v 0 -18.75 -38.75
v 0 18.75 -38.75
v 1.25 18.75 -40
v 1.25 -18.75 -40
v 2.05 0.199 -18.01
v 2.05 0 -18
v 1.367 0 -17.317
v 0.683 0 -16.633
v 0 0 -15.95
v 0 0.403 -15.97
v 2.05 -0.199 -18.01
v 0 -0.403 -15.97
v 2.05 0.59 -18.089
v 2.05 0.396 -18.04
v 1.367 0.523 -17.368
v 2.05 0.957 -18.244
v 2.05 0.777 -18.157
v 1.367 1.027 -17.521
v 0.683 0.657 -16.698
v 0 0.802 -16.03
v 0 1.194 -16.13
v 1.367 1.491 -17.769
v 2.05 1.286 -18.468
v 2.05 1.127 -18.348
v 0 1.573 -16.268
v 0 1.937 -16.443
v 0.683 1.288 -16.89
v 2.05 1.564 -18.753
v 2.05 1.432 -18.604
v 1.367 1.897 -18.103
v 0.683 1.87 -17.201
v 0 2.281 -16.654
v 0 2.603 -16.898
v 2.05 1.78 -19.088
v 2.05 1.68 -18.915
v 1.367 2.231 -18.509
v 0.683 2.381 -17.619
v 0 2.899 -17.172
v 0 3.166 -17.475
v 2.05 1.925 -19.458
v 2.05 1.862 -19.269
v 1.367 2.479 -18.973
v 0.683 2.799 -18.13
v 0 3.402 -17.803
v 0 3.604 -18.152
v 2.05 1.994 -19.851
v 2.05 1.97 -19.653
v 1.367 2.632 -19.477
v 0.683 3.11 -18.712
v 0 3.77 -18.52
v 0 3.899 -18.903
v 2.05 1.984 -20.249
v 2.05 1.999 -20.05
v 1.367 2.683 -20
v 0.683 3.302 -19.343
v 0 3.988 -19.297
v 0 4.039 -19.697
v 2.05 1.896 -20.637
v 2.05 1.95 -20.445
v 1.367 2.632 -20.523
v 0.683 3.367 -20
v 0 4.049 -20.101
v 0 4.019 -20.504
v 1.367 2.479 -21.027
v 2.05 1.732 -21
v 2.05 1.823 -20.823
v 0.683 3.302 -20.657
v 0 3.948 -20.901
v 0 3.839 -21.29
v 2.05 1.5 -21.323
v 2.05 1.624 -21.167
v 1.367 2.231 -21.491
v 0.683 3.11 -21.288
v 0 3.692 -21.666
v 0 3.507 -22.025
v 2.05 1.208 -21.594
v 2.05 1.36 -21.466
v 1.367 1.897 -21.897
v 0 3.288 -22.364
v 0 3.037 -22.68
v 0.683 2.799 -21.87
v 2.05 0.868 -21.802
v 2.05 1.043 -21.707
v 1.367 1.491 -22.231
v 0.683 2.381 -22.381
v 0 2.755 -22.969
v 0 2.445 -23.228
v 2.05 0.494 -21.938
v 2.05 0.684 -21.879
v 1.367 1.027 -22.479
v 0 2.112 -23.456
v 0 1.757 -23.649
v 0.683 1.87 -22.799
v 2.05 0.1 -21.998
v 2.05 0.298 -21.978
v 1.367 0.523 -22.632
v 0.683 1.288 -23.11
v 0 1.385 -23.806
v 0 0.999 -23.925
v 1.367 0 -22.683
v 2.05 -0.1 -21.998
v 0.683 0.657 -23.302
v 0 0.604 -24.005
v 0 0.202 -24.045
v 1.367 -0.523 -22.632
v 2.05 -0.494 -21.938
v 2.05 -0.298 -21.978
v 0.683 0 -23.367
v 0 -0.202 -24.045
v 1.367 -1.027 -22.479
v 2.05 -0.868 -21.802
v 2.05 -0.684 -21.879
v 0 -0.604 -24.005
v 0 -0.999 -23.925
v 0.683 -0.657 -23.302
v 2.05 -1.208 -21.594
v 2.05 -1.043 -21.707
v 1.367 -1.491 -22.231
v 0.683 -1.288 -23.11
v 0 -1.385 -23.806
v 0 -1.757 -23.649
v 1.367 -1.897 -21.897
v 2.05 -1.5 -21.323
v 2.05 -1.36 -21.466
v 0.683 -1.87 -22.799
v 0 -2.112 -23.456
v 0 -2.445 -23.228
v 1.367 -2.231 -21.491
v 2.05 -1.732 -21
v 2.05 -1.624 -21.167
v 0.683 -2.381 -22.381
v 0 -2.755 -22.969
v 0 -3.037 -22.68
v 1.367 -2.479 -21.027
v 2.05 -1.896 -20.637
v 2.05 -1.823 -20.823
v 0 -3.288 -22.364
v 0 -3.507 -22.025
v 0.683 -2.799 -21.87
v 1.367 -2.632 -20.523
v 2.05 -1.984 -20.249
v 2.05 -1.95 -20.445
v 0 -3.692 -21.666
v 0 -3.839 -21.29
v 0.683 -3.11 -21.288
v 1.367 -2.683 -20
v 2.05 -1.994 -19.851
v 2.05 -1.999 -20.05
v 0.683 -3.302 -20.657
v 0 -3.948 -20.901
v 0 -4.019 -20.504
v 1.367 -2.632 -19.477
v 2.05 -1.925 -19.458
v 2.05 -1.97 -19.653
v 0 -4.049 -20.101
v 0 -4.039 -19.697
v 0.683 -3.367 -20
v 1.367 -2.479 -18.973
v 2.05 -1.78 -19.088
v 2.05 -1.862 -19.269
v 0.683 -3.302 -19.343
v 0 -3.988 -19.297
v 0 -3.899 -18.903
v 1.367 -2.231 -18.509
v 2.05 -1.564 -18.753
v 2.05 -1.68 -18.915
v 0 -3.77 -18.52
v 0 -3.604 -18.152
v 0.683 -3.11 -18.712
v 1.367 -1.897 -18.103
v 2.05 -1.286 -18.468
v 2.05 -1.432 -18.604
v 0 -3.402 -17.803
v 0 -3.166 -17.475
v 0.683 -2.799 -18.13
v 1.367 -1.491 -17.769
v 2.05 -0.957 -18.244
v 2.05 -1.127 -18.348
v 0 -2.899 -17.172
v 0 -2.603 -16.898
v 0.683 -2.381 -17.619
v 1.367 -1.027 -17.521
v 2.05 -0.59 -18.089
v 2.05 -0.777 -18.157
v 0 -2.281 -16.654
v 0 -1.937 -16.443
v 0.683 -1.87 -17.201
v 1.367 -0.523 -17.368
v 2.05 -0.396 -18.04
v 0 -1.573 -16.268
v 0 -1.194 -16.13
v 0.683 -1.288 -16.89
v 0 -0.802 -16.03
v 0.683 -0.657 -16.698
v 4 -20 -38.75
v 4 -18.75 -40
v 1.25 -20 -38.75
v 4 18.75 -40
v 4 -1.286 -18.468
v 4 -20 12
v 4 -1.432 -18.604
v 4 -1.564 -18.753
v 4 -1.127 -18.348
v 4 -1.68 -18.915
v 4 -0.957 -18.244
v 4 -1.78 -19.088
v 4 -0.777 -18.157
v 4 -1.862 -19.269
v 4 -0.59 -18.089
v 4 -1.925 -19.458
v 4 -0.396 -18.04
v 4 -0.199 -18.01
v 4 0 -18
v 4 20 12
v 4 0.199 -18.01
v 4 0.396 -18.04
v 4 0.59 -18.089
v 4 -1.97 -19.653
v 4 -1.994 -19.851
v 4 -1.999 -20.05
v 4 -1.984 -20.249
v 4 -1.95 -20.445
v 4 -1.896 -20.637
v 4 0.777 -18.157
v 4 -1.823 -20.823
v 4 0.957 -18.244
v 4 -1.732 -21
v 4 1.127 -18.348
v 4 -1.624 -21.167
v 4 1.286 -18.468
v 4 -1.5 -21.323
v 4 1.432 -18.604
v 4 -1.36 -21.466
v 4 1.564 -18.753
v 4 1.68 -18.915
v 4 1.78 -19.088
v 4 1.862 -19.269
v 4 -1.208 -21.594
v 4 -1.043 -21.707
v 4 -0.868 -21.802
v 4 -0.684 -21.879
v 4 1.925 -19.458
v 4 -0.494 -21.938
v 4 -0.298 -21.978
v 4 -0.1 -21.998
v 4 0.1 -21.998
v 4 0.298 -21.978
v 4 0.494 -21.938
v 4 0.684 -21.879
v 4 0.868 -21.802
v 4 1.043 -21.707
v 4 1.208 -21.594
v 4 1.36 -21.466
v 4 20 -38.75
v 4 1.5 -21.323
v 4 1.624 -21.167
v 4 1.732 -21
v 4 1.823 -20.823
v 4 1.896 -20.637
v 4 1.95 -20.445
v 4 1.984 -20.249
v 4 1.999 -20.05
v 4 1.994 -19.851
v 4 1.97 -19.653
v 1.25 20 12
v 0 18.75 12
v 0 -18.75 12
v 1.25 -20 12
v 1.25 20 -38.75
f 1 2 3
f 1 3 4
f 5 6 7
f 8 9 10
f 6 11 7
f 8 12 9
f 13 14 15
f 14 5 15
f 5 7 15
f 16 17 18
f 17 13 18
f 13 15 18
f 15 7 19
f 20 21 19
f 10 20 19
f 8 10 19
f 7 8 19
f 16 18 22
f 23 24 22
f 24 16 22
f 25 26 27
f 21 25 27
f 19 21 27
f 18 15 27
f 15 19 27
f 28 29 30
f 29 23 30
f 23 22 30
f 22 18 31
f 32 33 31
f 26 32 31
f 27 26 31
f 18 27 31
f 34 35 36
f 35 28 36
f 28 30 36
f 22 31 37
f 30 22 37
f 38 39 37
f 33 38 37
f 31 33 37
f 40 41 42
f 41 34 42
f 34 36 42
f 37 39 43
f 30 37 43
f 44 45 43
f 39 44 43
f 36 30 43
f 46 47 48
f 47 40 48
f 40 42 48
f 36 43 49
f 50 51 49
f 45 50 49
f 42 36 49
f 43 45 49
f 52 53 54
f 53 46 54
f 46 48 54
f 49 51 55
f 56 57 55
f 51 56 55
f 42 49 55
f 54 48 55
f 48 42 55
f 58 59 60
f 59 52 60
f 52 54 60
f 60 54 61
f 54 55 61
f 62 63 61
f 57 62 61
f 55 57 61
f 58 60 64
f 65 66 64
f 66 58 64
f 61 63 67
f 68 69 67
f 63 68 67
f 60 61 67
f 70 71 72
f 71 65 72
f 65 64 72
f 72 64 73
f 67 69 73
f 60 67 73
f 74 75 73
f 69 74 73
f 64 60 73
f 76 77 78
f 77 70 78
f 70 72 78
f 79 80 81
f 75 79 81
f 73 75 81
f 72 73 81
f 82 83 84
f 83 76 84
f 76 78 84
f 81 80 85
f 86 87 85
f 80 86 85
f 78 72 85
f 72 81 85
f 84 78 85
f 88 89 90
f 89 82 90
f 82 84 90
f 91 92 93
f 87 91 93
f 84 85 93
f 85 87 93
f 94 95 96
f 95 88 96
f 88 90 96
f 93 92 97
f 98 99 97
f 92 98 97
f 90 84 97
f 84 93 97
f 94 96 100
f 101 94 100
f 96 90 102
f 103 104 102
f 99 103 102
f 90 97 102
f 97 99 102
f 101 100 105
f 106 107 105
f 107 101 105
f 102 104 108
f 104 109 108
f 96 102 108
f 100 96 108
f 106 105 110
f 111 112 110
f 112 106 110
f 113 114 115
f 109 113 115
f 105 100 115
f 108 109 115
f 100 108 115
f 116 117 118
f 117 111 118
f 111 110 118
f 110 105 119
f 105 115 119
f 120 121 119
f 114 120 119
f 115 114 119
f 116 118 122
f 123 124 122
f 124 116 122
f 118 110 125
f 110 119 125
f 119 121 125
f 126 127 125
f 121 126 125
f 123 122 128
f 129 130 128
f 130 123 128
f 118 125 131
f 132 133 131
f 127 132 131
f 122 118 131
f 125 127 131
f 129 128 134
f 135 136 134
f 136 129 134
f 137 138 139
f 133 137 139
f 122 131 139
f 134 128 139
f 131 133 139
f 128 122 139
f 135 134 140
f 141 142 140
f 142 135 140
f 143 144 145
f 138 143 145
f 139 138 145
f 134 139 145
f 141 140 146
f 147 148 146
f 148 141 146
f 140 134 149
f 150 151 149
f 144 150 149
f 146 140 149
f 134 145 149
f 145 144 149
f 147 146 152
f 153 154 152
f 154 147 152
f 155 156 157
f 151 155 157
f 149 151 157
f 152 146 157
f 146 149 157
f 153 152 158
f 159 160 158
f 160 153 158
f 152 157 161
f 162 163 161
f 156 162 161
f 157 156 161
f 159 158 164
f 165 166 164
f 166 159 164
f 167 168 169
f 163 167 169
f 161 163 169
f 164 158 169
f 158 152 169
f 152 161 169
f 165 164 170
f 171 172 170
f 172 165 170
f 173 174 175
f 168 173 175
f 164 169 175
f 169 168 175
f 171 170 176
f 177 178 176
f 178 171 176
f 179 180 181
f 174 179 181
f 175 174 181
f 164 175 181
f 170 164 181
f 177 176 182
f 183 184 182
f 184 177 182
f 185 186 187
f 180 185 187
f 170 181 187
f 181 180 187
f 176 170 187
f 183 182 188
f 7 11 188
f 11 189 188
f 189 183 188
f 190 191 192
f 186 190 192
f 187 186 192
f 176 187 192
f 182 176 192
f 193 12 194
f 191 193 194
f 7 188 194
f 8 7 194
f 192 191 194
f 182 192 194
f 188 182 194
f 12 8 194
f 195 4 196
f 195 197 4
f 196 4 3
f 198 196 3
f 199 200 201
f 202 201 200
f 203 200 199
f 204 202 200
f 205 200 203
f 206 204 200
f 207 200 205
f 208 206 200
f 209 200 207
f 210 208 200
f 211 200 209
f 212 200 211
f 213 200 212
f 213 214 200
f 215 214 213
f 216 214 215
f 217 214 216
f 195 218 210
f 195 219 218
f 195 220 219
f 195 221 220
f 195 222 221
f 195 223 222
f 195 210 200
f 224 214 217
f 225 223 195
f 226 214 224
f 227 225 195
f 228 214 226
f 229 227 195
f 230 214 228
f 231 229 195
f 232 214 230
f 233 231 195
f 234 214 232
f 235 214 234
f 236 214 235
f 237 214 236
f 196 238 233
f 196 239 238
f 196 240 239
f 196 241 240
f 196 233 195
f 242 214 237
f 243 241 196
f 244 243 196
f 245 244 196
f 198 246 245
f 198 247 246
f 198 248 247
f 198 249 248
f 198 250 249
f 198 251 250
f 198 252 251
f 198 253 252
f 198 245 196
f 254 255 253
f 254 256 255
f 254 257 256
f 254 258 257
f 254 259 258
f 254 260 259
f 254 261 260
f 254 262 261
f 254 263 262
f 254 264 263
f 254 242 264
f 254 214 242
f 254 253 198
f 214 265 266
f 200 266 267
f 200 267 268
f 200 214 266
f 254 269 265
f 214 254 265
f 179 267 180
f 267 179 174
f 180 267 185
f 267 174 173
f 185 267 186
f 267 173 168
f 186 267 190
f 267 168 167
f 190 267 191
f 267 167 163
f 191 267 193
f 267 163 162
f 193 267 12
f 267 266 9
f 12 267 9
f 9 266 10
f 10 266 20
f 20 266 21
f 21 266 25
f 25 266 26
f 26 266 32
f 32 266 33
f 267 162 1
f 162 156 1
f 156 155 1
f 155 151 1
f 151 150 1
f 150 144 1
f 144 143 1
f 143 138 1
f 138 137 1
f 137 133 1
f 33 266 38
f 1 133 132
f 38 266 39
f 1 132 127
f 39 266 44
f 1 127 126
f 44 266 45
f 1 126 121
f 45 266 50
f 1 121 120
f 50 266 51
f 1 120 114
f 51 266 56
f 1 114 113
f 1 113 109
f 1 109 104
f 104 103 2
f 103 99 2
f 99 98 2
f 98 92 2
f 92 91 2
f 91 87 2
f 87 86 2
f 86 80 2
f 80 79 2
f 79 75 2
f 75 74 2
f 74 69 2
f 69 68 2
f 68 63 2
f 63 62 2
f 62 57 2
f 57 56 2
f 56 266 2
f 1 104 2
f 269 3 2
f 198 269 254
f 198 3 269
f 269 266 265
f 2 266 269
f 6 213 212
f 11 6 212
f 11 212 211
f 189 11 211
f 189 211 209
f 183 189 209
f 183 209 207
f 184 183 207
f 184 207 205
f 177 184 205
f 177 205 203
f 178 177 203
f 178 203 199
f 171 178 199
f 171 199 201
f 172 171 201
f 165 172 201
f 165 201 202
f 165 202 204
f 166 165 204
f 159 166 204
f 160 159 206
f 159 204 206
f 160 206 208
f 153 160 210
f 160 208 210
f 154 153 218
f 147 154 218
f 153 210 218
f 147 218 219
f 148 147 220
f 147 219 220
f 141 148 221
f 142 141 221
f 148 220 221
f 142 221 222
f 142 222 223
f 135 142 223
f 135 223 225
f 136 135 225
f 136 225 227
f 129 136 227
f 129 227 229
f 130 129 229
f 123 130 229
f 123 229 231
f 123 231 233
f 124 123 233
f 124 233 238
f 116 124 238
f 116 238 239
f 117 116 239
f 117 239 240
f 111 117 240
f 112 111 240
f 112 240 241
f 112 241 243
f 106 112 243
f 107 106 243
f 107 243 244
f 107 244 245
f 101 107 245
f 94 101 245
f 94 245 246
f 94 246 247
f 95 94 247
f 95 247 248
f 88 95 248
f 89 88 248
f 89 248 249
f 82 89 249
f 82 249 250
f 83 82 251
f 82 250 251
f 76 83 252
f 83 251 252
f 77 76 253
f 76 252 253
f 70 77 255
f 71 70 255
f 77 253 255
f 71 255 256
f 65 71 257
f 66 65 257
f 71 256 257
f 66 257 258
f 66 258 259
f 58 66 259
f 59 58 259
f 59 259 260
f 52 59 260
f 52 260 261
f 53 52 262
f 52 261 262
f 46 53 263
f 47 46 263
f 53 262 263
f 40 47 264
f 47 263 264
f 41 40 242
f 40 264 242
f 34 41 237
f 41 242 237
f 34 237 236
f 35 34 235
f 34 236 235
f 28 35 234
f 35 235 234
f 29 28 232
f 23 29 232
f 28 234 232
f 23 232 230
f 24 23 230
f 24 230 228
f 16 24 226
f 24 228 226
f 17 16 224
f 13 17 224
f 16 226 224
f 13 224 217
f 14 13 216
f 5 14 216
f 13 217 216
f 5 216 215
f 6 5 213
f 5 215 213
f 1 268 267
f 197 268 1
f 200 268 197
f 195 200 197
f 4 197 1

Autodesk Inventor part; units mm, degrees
sketch "Skizze_1" plane through (0, 0, 0) normal (1, 0, 0) x (0, 0, -1)
  line L0 (-40, 20) -> (-40, -20)
  line L1 (-40, -20) -> (40, -20)
  line L2 (40, -20) -> (40, 20)
  line L3 (40, 20) -> (-40, 20)
extrude "Extrusion1" add sketch "Skizze_1" along normal blind 4
sketch "Sketch2" plane through (0, 0, 0) normal (-1, 0, 0) x (0, 0, 1)
  point P0 (20, 0)
hole "Hole1" at (0, 0, 20) direction (1, 0, 0) diameter 4 depth 4 countersink diameter 8.1 countersink angle 90
sketch "Sketch3" plane through (0, 0, 0) normal (-1, 0, 0) x (0, 0, 1)
  point P0 (-20, 0)
hole "Hole2" at (0, 0, -20) direction (1, 0, 0) diameter 4 depth 4 countersink diameter 8.1 countersink angle 90
ref_plane "CS_ANBAU_CAP_XY" through (0, 0, 0) normal (0, 1, 0) x (1, 0, 0)
ref_plane "CS_ANBAU_CAP_YZ" through (0, 0, 0) normal (1, 0, 0) x (0, 0, -1)
ref_plane "CS_ANBAU_CAP_ZX" through (0, 0, 0) normal (0, 0, -1) x (0, 1, 0)
ref_plane "CS_ANBAU_CAP_90_XY" through (0, 0, 0) normal (0, 0, 1) x (1, 0, 0)
ref_plane "CS_ANBAU_CAP_90_YZ" through (0, 0, 0) normal (1, 0, 0) x (0, 1, 0)
ref_plane "CS_ANBAU_CAP_90_ZX" through (0, 0, 0) normal (0, 1, 0) x (0, 0, 1)
ref_plane "IB_1_XY" through (0, 0, 0) normal (1, 0, 0) x (0, 0, -1)
ref_plane "IB_1_YZ" through (0, 0, 0) normal (0, 0, -1) x (0, 1, 0)
ref_plane "IB_1_ZX" through (0, 0, 0) normal (0, 1, 0) x (1, 0, 0)
ref_plane "IB_10_XY" through (0, -14, 30) normal (1, 0, 0) x (0, 0, -1)
ref_plane "IB_10_YZ" through (0, -14, 30) normal (0, 0, -1) x (0, 1, 0)
ref_plane "IB_10_ZX" through (0, -14, 30) normal (0, 1, 0) x (1, 0, 0)
ref_plane "IB_11_XY" through (0, 14, 30) normal (1, 0, 0) x (0, 0, -1)
ref_plane "IB_11_YZ" through (0, 14, 30) normal (0, 0, -1) x (0, 1, 0)
ref_plane "IB_11_ZX" through (0, 14, 30) normal (0, 1, 0) x (1, 0, 0)
ref_plane "IB_12_XY" through (0, 0, -20) normal (1, 0, 0) x (0, 0, -1)
ref_plane "IB_12_YZ" through (0, 0, -20) normal (0, 0, -1) x (0, 1, 0)
ref_plane "IB_12_ZX" through (0, 0, -20) normal (0, 1, 0) x (1, 0, 0)
ref_plane "IB_2_XY" through (0, 0, -20) normal (1, 0, 0) x (0, 0, -1)
ref_plane "IB_2_YZ" through (0, 0, -20) normal (0, 0, -1) x (0, 1, 0)
ref_plane "IB_2_ZX" through (0, 0, -20) normal (0, 1, 0) x (1, 0, 0)
ref_plane "IB_3_XY" through (0, 0, 20) normal (1, 0, 0) x (0, 0, -1)
ref_plane "IB_3_YZ" through (0, 0, 20) normal (0, 0, -1) x (0, 1, 0)
ref_plane "IB_3_ZX" through (0, 0, 20) normal (0, 1, 0) x (1, 0, 0)
ref_plane "IB_4_XY" through (0, 13.5, -33.5) normal (1, 0, 0) x (0, 0, -1)
ref_plane "IB_4_YZ" through (0, 13.5, -33.5) normal (0, 0, -1) x (0, 1, 0)
ref_plane "IB_4_ZX" through (0, 13.5, -33.5) normal (0, 1, 0) x (1, 0, 0)
ref_plane "IB_5_XY" through (0, 13.5, 33.5) normal (1, 0, 0) x (0, 0, -1)
ref_plane "IB_5_YZ" through (0, 13.5, 33.5) normal (0, 0, -1) x (0, 1, 0)
ref_plane "IB_5_ZX" through (0, 13.5, 33.5) normal (0, 1, 0) x (1, 0, 0)
ref_plane "IB_6_XY" through (0, 1.5, 26.5) normal (1, 0, 0) x (0, 0, -1)
ref_plane "IB_6_YZ" through (0, 1.5, 26.5) normal (0, 0, -1) x (0, 1, 0)
ref_plane "IB_6_ZX" through (0, 1.5, 26.5) normal (0, 1, 0) x (1, 0, 0)
ref_plane "IB_7_XY" through (0, 1.5, -26.5) normal (1, 0, 0) x (0, 0, -1)
ref_plane "IB_7_YZ" through (0, 1.5, -26.5) normal (0, 0, -1) x (0, 1, 0)
ref_plane "IB_7_ZX" through (0, 1.5, -26.5) normal (0, 1, 0) x (1, 0, 0)
ref_plane "IB_8_XY" through (0, -2, 34) normal (1, 0, 0) x (0, 0, -1)
ref_plane "IB_8_YZ" through (0, -2, 34) normal (0, 0, -1) x (0, 1, 0)
ref_plane "IB_8_ZX" through (0, -2, 34) normal (0, 1, 0) x (1, 0, 0)
ref_plane "IB_9_XY" through (0, -2, -34) normal (1, 0, 0) x (0, 0, -1)
ref_plane "IB_9_YZ" through (0, -2, -34) normal (0, 0, -1) x (0, 1, 0)
ref_plane "IB_9_ZX" through (0, -2, -34) normal (0, 1, 0) x (1, 0, 0)
chamfer "Chamfer1" distance 1.25 angle 45 8 edges at (2, -20, 40) (0, -20, 0) (0, 0, 40) (2, -20, -40) (0, 0, -40) (2, 20, -40) (0, 20, 0) (2, 20, 40)
sketch "Sketch5" plane through (4, 0, 0) normal (1, 0, 0) x (0, 0, -1)
  line L0 (-38.75, -20) -> (38.75, -20) projected
  line L1 (-12, -20) -> (-40, -20)
  line L2 (-40, -20) -> (-40, 20)
  line L3 (-40, 20) -> (-12, 20)
  line L4 (-12, 20) -> (-12, -20)
  line L5 (-40, 18.75) -> (-40, -18.75) projected
  line L6 (38.75, 20) -> (-38.75, 20) projected
  line L7 (40, -18.75) -> (40, 18.75) projected
  point P0 (0, 0)
  dimension "d32" = 52
extrude "Extrusion2" cut sketch "Sketch5" against normal through all
properties part number "Robotunits CAP_4080_1" material "ABS PlastiK"
